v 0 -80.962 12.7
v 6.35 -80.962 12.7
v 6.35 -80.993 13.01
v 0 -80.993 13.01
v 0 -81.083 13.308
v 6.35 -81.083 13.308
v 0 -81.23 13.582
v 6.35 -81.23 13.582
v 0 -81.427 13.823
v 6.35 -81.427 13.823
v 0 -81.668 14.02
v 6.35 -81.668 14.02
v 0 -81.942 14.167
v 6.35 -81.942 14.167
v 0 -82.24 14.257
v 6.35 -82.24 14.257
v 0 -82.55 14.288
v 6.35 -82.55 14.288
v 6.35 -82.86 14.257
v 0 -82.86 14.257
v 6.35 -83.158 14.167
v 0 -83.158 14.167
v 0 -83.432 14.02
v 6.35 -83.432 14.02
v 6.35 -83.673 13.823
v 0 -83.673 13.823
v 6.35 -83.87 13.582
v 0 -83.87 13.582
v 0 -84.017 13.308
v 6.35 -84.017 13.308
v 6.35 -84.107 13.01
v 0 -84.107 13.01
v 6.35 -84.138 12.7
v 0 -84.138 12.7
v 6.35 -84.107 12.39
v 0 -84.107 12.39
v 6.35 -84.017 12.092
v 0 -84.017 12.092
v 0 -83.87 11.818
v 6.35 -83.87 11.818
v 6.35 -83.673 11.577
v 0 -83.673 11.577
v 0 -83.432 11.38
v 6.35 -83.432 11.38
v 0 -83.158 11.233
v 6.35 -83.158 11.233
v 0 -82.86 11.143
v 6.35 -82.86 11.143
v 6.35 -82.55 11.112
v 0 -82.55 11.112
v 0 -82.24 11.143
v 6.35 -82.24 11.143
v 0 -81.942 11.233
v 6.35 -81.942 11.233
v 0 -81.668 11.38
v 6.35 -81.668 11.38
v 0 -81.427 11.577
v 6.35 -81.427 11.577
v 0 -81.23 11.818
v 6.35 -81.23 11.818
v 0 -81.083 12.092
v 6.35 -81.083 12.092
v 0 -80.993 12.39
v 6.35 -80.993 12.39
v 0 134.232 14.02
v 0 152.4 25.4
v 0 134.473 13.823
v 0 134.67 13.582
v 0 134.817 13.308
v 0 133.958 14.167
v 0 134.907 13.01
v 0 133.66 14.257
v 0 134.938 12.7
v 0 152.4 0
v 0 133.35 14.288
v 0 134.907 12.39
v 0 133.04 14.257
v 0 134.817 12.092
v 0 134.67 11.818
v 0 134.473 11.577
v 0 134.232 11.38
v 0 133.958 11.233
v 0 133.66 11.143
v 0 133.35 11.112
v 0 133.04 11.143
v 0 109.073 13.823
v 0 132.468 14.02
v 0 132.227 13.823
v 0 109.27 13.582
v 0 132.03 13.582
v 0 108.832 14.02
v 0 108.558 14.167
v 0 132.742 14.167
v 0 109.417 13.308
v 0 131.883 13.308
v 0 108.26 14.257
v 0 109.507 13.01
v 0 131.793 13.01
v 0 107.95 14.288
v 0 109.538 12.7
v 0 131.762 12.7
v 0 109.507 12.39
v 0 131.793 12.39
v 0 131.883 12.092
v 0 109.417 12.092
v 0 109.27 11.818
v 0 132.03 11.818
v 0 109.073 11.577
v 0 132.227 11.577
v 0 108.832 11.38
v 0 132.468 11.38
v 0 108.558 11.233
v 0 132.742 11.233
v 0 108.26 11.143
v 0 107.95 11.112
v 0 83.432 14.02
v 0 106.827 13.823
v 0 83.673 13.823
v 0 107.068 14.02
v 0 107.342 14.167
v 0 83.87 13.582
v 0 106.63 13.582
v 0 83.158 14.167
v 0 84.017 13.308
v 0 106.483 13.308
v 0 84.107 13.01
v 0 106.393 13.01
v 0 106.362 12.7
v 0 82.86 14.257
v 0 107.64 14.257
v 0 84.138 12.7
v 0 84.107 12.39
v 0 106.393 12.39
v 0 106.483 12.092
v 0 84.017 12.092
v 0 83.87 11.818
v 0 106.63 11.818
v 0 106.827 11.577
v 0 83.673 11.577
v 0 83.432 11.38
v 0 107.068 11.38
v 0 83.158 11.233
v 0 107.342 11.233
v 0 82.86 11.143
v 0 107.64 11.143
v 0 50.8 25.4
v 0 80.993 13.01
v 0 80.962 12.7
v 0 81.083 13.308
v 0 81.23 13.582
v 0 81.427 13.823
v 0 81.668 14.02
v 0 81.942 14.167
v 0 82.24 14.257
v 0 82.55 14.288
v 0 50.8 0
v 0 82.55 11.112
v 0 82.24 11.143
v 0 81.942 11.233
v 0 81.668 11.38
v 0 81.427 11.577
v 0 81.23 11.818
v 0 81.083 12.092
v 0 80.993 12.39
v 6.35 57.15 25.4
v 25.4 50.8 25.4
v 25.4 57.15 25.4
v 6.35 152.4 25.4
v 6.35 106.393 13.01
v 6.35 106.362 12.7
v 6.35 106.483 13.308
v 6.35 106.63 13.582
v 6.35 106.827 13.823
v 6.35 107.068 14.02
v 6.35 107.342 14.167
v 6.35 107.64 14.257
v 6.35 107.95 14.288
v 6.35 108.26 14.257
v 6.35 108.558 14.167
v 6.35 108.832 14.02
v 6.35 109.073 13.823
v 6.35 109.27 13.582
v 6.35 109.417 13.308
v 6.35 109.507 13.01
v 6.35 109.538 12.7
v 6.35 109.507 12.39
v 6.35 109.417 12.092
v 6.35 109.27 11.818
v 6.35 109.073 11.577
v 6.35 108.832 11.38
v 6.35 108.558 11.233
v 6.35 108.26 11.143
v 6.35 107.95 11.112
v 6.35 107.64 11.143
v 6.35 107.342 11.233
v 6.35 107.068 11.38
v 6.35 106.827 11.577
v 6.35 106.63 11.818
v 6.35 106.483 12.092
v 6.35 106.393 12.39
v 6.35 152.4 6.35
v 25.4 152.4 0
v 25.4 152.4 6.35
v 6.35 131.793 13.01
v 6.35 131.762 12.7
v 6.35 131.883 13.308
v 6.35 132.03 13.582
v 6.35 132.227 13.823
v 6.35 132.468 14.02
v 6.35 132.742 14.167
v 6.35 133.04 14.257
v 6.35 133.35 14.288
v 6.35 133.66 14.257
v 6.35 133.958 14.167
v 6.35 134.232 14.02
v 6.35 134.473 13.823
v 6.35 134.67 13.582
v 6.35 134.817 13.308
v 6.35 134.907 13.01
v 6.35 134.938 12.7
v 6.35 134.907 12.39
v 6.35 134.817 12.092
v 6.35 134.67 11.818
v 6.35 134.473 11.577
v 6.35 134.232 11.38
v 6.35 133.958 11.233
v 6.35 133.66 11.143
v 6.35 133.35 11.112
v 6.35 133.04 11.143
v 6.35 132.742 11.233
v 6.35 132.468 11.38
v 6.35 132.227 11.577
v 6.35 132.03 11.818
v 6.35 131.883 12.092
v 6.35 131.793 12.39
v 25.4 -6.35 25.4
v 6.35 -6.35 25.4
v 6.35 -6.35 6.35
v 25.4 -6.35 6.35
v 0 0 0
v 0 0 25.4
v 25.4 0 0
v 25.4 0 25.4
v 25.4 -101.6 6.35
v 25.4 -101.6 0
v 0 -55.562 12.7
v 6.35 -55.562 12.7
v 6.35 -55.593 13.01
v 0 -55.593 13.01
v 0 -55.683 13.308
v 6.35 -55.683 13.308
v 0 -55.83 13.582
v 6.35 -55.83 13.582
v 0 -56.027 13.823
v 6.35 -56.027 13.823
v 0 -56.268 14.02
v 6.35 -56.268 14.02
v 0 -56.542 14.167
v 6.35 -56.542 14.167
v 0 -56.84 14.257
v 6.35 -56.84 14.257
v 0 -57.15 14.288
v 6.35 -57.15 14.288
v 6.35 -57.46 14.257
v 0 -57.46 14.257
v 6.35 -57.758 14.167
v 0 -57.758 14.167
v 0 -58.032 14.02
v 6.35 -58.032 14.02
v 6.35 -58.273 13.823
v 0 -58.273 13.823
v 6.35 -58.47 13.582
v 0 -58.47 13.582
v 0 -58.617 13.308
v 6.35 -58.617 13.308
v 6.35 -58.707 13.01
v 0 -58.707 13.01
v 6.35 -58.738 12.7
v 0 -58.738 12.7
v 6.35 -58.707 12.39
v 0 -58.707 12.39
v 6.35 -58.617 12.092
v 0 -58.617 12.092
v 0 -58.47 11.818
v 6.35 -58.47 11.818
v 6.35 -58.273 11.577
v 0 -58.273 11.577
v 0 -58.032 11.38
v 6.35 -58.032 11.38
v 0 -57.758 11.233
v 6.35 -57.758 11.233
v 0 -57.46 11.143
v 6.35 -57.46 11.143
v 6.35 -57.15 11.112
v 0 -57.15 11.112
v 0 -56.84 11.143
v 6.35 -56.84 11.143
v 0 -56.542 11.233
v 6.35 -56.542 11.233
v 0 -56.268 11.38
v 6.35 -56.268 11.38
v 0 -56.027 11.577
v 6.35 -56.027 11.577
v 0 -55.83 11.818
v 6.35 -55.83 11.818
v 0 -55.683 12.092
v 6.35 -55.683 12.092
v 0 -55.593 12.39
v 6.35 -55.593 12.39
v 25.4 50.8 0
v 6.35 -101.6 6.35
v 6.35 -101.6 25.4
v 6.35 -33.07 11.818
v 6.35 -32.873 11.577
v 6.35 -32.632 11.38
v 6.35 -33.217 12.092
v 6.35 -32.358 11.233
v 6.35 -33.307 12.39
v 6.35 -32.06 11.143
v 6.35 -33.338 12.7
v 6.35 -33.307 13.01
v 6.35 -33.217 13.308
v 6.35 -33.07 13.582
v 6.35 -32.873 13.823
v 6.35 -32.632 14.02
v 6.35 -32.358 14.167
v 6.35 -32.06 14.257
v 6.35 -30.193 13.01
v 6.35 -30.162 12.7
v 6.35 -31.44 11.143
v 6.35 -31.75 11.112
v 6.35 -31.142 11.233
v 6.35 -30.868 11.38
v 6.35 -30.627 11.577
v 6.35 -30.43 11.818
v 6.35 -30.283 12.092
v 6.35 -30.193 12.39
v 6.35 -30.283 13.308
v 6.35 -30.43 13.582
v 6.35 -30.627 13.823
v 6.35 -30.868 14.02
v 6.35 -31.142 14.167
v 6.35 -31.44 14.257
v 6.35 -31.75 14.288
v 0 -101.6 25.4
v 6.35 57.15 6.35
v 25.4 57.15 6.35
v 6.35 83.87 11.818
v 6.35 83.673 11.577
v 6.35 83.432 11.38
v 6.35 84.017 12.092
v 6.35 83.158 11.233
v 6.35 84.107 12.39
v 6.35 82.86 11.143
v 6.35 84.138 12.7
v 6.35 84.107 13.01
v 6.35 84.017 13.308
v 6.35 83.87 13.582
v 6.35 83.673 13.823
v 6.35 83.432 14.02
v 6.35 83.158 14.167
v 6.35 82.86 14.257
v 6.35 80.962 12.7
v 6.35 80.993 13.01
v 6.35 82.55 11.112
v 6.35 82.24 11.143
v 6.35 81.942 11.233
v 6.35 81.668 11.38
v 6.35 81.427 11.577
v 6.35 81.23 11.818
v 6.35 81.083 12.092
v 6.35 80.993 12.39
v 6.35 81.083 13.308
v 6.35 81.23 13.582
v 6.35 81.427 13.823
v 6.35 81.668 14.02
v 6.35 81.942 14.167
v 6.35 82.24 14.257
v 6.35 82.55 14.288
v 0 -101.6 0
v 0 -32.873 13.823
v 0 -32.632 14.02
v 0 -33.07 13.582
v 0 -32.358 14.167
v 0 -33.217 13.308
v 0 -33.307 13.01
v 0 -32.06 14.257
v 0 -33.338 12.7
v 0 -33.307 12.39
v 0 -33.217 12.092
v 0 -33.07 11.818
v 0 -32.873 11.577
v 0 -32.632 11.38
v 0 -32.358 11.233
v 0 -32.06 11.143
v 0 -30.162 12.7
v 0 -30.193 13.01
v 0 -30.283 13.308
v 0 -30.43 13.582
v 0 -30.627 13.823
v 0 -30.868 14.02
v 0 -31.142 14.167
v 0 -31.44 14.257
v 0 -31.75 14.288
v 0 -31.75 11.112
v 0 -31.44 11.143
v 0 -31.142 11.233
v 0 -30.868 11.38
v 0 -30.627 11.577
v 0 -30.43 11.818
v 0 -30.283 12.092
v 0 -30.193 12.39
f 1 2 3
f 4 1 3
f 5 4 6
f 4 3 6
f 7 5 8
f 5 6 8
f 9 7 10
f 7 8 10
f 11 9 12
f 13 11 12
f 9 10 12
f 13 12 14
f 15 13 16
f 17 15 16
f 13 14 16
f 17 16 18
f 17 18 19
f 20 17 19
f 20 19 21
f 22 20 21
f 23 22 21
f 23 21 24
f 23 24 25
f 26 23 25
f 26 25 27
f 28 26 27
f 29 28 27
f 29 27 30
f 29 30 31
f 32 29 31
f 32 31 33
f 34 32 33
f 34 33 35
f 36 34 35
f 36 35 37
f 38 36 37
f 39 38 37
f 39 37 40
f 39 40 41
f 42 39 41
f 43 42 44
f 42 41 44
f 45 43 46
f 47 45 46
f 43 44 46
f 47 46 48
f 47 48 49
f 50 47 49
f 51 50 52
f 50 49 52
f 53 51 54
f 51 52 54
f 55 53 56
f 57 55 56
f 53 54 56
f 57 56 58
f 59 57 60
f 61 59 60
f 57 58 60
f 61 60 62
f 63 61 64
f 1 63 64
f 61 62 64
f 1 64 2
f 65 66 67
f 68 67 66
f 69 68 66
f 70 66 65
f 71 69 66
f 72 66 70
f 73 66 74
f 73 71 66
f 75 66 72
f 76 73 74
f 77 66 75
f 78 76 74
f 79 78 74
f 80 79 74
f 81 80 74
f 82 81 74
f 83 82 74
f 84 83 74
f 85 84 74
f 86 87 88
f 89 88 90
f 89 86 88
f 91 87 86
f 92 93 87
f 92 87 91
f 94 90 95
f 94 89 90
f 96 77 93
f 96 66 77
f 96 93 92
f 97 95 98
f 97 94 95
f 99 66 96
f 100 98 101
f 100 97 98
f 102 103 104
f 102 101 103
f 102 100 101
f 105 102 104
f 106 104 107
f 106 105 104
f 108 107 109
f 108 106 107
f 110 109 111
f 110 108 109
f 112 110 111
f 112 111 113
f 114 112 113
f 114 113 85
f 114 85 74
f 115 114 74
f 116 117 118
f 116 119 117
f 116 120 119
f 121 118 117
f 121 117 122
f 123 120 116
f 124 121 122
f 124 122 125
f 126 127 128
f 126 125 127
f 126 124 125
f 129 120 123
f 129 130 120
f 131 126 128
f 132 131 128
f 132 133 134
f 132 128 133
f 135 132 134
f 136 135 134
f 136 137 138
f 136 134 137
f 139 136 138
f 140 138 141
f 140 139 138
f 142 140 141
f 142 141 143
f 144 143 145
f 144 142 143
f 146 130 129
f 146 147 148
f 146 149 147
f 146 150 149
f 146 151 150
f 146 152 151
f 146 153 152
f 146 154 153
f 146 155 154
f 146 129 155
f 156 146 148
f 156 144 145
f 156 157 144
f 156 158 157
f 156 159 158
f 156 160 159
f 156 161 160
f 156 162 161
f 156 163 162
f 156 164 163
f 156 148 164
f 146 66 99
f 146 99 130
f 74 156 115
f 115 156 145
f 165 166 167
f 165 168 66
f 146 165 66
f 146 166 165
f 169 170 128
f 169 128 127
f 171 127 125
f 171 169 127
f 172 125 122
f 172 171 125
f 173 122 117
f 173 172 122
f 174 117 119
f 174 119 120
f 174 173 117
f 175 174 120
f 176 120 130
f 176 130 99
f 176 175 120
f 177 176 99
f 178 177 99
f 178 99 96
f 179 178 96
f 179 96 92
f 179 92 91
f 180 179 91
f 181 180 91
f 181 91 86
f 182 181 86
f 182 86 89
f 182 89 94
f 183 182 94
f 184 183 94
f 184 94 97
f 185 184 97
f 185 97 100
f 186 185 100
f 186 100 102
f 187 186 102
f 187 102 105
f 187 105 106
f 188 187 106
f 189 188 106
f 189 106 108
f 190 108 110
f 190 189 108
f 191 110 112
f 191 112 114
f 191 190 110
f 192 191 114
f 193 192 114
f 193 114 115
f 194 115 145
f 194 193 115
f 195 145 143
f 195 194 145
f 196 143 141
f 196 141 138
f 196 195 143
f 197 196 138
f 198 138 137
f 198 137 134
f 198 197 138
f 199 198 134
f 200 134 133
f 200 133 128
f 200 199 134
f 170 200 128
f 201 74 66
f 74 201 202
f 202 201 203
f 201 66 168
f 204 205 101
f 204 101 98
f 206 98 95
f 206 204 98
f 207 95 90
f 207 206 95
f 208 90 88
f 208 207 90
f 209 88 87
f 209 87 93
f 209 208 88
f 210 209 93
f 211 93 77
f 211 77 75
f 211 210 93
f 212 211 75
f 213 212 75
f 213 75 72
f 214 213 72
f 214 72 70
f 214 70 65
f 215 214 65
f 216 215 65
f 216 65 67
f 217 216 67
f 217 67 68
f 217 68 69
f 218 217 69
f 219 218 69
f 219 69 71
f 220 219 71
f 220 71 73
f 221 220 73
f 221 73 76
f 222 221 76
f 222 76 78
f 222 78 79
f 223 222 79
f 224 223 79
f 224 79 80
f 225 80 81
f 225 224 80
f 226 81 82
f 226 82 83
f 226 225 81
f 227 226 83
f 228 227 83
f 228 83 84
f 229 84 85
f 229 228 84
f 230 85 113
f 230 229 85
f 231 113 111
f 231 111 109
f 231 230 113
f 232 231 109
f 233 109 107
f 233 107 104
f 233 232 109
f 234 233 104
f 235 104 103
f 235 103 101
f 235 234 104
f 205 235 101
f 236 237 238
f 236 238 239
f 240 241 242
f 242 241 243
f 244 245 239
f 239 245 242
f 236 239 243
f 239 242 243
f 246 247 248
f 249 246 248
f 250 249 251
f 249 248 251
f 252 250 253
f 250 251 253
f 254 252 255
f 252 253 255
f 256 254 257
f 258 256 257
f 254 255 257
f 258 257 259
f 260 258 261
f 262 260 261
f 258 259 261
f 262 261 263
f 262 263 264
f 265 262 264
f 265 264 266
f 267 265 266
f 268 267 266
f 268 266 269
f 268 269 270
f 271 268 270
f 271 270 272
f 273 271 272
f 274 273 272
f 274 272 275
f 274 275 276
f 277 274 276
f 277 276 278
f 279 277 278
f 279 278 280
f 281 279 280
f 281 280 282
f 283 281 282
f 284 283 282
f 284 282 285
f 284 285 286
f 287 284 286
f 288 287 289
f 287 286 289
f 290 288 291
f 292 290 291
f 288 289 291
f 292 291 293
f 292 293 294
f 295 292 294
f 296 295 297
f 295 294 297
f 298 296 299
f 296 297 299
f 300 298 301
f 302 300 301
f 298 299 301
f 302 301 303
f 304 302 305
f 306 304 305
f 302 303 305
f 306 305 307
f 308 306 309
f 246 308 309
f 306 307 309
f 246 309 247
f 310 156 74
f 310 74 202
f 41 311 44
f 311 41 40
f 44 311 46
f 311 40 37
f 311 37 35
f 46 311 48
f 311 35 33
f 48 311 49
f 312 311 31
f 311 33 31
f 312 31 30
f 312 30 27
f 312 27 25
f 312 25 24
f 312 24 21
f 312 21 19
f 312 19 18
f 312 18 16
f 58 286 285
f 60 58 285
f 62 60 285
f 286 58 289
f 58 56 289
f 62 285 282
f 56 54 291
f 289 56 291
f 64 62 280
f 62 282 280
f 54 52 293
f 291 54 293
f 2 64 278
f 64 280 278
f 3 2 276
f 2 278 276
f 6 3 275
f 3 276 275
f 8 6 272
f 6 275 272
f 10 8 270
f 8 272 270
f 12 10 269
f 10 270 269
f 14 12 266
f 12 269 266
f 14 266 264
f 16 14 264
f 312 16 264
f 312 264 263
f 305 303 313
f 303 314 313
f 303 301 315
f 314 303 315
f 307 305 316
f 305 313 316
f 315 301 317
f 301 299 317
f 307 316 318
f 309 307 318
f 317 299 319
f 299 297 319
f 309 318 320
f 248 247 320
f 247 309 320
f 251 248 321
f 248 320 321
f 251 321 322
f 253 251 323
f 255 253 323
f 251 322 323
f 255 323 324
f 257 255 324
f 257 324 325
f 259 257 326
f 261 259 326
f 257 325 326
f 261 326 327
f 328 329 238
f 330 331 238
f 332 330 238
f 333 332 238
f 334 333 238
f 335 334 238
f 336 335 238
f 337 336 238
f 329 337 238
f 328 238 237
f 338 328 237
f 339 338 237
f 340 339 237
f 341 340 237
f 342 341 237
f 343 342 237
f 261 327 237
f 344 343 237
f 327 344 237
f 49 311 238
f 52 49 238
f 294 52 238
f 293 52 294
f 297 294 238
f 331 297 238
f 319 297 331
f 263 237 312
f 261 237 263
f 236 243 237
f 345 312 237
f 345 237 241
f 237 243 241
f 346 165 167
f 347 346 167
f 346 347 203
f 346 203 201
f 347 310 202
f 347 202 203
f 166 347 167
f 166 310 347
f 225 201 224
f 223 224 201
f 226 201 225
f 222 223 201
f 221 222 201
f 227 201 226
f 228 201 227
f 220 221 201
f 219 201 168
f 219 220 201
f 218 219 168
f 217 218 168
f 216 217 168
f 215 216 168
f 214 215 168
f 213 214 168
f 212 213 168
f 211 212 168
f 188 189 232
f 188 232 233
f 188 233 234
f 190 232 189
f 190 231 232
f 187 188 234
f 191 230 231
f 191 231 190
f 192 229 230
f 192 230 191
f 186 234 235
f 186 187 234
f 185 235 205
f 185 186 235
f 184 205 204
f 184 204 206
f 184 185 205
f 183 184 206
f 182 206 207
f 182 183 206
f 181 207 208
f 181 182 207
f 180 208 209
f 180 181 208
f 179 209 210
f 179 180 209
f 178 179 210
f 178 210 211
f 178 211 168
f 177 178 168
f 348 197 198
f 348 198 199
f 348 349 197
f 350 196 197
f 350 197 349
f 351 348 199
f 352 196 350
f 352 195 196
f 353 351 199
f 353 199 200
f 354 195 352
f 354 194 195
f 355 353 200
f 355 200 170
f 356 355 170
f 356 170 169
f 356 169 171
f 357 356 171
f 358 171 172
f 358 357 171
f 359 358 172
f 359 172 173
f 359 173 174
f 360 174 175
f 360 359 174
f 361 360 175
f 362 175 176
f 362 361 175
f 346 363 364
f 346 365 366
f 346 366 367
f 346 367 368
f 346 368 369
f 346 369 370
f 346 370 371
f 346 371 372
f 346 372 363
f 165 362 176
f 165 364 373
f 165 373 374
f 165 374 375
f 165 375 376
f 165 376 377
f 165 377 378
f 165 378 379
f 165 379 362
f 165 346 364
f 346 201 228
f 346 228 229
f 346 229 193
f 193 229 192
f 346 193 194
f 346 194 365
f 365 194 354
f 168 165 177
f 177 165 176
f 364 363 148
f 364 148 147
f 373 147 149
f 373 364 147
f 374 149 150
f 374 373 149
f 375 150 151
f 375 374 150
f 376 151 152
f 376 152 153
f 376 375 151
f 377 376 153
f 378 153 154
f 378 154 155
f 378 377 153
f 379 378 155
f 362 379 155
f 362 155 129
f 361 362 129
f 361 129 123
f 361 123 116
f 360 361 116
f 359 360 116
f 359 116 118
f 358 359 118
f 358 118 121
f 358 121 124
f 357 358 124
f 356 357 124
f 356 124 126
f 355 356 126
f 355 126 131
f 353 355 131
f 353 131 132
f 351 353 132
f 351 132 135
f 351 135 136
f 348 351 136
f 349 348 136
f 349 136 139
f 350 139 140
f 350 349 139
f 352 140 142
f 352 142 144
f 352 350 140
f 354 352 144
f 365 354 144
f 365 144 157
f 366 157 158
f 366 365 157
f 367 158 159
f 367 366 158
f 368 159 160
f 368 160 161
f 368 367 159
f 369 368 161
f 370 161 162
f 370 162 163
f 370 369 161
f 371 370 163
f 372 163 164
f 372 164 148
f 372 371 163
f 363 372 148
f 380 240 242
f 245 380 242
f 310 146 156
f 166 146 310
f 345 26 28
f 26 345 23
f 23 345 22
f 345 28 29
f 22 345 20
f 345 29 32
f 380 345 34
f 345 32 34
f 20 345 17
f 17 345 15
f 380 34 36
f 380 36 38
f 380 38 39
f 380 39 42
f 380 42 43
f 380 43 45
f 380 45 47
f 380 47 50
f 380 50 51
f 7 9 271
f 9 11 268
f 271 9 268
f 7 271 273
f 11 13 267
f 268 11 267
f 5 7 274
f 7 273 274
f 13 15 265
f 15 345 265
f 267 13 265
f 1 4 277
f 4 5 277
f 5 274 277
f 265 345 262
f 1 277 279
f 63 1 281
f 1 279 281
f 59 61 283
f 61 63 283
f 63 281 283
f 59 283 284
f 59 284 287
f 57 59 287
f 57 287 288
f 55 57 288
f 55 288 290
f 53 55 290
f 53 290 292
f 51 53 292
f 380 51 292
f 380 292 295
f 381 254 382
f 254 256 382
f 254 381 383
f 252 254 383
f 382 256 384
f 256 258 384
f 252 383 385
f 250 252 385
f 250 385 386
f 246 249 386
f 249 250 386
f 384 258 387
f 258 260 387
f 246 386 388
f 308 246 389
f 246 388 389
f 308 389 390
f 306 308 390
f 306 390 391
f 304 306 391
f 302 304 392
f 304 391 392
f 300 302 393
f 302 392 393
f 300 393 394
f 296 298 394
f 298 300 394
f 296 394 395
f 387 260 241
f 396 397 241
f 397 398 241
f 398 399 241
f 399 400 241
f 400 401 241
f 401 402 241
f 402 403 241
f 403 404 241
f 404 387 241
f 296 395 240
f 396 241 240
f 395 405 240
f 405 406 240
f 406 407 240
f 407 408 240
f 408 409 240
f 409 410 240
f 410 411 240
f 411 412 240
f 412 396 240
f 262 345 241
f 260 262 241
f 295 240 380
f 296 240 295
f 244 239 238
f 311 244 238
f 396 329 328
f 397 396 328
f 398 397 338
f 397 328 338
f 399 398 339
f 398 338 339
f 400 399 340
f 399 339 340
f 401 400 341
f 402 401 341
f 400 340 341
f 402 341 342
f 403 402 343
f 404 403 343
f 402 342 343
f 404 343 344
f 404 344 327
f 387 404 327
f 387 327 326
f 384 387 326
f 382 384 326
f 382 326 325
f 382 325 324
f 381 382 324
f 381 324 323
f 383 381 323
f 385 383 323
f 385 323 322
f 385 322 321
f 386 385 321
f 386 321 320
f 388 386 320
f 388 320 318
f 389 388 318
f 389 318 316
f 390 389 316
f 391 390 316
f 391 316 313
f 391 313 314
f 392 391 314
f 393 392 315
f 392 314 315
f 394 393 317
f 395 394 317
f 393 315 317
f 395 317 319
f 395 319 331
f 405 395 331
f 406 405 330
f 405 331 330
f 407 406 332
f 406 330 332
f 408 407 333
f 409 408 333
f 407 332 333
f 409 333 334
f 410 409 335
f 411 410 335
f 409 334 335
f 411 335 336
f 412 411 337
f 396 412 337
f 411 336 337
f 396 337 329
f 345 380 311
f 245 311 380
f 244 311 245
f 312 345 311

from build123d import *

# Parameters (mm, degrees)
F1_DEPTH = 101.6
F2_W     = 25.4
F2_H     = 25.4
F3_DEPTH = 6.35
F4_R     = 1.5875
F5_DEPTH = 25.4


with BuildPart() as f1:
    # F0 (on Front) → F1 (new body)
    with BuildSketch(Plane.XZ):
        Polygon((0, 25.4), (0, 0), (25.4, 0), (25.4, 6.35), (6.35, 6.35), (6.35, 25.4), align=None)
    extrude(amount=F1_DEPTH)

    # F2 (on Front) → F3 (join)
    with BuildSketch(Plane.XZ):
        with Locations((12.7, 12.7)):
            Rectangle(F2_W, F2_H)
    extrude(amount=F3_DEPTH)

    # F4 (on face) → F5 (cut)
    with BuildSketch(Plane.YZ.offset(6.35)):
        with Locations((-31.75, 12.7)):
            Circle(F4_R)
        with Locations((-57.15, 12.7)):
            Circle(F4_R)
        with Locations((-82.55, 12.7)):
            Circle(F4_R)
    extrude(amount=-F5_DEPTH, mode=Mode.SUBTRACT)


with BuildPart() as f7_1:
    # F7: instance of F1
    add(f1.part.mirror(Plane.XZ.offset(-25.4)))


solid = Compound([f1.part, f7_1.part])
